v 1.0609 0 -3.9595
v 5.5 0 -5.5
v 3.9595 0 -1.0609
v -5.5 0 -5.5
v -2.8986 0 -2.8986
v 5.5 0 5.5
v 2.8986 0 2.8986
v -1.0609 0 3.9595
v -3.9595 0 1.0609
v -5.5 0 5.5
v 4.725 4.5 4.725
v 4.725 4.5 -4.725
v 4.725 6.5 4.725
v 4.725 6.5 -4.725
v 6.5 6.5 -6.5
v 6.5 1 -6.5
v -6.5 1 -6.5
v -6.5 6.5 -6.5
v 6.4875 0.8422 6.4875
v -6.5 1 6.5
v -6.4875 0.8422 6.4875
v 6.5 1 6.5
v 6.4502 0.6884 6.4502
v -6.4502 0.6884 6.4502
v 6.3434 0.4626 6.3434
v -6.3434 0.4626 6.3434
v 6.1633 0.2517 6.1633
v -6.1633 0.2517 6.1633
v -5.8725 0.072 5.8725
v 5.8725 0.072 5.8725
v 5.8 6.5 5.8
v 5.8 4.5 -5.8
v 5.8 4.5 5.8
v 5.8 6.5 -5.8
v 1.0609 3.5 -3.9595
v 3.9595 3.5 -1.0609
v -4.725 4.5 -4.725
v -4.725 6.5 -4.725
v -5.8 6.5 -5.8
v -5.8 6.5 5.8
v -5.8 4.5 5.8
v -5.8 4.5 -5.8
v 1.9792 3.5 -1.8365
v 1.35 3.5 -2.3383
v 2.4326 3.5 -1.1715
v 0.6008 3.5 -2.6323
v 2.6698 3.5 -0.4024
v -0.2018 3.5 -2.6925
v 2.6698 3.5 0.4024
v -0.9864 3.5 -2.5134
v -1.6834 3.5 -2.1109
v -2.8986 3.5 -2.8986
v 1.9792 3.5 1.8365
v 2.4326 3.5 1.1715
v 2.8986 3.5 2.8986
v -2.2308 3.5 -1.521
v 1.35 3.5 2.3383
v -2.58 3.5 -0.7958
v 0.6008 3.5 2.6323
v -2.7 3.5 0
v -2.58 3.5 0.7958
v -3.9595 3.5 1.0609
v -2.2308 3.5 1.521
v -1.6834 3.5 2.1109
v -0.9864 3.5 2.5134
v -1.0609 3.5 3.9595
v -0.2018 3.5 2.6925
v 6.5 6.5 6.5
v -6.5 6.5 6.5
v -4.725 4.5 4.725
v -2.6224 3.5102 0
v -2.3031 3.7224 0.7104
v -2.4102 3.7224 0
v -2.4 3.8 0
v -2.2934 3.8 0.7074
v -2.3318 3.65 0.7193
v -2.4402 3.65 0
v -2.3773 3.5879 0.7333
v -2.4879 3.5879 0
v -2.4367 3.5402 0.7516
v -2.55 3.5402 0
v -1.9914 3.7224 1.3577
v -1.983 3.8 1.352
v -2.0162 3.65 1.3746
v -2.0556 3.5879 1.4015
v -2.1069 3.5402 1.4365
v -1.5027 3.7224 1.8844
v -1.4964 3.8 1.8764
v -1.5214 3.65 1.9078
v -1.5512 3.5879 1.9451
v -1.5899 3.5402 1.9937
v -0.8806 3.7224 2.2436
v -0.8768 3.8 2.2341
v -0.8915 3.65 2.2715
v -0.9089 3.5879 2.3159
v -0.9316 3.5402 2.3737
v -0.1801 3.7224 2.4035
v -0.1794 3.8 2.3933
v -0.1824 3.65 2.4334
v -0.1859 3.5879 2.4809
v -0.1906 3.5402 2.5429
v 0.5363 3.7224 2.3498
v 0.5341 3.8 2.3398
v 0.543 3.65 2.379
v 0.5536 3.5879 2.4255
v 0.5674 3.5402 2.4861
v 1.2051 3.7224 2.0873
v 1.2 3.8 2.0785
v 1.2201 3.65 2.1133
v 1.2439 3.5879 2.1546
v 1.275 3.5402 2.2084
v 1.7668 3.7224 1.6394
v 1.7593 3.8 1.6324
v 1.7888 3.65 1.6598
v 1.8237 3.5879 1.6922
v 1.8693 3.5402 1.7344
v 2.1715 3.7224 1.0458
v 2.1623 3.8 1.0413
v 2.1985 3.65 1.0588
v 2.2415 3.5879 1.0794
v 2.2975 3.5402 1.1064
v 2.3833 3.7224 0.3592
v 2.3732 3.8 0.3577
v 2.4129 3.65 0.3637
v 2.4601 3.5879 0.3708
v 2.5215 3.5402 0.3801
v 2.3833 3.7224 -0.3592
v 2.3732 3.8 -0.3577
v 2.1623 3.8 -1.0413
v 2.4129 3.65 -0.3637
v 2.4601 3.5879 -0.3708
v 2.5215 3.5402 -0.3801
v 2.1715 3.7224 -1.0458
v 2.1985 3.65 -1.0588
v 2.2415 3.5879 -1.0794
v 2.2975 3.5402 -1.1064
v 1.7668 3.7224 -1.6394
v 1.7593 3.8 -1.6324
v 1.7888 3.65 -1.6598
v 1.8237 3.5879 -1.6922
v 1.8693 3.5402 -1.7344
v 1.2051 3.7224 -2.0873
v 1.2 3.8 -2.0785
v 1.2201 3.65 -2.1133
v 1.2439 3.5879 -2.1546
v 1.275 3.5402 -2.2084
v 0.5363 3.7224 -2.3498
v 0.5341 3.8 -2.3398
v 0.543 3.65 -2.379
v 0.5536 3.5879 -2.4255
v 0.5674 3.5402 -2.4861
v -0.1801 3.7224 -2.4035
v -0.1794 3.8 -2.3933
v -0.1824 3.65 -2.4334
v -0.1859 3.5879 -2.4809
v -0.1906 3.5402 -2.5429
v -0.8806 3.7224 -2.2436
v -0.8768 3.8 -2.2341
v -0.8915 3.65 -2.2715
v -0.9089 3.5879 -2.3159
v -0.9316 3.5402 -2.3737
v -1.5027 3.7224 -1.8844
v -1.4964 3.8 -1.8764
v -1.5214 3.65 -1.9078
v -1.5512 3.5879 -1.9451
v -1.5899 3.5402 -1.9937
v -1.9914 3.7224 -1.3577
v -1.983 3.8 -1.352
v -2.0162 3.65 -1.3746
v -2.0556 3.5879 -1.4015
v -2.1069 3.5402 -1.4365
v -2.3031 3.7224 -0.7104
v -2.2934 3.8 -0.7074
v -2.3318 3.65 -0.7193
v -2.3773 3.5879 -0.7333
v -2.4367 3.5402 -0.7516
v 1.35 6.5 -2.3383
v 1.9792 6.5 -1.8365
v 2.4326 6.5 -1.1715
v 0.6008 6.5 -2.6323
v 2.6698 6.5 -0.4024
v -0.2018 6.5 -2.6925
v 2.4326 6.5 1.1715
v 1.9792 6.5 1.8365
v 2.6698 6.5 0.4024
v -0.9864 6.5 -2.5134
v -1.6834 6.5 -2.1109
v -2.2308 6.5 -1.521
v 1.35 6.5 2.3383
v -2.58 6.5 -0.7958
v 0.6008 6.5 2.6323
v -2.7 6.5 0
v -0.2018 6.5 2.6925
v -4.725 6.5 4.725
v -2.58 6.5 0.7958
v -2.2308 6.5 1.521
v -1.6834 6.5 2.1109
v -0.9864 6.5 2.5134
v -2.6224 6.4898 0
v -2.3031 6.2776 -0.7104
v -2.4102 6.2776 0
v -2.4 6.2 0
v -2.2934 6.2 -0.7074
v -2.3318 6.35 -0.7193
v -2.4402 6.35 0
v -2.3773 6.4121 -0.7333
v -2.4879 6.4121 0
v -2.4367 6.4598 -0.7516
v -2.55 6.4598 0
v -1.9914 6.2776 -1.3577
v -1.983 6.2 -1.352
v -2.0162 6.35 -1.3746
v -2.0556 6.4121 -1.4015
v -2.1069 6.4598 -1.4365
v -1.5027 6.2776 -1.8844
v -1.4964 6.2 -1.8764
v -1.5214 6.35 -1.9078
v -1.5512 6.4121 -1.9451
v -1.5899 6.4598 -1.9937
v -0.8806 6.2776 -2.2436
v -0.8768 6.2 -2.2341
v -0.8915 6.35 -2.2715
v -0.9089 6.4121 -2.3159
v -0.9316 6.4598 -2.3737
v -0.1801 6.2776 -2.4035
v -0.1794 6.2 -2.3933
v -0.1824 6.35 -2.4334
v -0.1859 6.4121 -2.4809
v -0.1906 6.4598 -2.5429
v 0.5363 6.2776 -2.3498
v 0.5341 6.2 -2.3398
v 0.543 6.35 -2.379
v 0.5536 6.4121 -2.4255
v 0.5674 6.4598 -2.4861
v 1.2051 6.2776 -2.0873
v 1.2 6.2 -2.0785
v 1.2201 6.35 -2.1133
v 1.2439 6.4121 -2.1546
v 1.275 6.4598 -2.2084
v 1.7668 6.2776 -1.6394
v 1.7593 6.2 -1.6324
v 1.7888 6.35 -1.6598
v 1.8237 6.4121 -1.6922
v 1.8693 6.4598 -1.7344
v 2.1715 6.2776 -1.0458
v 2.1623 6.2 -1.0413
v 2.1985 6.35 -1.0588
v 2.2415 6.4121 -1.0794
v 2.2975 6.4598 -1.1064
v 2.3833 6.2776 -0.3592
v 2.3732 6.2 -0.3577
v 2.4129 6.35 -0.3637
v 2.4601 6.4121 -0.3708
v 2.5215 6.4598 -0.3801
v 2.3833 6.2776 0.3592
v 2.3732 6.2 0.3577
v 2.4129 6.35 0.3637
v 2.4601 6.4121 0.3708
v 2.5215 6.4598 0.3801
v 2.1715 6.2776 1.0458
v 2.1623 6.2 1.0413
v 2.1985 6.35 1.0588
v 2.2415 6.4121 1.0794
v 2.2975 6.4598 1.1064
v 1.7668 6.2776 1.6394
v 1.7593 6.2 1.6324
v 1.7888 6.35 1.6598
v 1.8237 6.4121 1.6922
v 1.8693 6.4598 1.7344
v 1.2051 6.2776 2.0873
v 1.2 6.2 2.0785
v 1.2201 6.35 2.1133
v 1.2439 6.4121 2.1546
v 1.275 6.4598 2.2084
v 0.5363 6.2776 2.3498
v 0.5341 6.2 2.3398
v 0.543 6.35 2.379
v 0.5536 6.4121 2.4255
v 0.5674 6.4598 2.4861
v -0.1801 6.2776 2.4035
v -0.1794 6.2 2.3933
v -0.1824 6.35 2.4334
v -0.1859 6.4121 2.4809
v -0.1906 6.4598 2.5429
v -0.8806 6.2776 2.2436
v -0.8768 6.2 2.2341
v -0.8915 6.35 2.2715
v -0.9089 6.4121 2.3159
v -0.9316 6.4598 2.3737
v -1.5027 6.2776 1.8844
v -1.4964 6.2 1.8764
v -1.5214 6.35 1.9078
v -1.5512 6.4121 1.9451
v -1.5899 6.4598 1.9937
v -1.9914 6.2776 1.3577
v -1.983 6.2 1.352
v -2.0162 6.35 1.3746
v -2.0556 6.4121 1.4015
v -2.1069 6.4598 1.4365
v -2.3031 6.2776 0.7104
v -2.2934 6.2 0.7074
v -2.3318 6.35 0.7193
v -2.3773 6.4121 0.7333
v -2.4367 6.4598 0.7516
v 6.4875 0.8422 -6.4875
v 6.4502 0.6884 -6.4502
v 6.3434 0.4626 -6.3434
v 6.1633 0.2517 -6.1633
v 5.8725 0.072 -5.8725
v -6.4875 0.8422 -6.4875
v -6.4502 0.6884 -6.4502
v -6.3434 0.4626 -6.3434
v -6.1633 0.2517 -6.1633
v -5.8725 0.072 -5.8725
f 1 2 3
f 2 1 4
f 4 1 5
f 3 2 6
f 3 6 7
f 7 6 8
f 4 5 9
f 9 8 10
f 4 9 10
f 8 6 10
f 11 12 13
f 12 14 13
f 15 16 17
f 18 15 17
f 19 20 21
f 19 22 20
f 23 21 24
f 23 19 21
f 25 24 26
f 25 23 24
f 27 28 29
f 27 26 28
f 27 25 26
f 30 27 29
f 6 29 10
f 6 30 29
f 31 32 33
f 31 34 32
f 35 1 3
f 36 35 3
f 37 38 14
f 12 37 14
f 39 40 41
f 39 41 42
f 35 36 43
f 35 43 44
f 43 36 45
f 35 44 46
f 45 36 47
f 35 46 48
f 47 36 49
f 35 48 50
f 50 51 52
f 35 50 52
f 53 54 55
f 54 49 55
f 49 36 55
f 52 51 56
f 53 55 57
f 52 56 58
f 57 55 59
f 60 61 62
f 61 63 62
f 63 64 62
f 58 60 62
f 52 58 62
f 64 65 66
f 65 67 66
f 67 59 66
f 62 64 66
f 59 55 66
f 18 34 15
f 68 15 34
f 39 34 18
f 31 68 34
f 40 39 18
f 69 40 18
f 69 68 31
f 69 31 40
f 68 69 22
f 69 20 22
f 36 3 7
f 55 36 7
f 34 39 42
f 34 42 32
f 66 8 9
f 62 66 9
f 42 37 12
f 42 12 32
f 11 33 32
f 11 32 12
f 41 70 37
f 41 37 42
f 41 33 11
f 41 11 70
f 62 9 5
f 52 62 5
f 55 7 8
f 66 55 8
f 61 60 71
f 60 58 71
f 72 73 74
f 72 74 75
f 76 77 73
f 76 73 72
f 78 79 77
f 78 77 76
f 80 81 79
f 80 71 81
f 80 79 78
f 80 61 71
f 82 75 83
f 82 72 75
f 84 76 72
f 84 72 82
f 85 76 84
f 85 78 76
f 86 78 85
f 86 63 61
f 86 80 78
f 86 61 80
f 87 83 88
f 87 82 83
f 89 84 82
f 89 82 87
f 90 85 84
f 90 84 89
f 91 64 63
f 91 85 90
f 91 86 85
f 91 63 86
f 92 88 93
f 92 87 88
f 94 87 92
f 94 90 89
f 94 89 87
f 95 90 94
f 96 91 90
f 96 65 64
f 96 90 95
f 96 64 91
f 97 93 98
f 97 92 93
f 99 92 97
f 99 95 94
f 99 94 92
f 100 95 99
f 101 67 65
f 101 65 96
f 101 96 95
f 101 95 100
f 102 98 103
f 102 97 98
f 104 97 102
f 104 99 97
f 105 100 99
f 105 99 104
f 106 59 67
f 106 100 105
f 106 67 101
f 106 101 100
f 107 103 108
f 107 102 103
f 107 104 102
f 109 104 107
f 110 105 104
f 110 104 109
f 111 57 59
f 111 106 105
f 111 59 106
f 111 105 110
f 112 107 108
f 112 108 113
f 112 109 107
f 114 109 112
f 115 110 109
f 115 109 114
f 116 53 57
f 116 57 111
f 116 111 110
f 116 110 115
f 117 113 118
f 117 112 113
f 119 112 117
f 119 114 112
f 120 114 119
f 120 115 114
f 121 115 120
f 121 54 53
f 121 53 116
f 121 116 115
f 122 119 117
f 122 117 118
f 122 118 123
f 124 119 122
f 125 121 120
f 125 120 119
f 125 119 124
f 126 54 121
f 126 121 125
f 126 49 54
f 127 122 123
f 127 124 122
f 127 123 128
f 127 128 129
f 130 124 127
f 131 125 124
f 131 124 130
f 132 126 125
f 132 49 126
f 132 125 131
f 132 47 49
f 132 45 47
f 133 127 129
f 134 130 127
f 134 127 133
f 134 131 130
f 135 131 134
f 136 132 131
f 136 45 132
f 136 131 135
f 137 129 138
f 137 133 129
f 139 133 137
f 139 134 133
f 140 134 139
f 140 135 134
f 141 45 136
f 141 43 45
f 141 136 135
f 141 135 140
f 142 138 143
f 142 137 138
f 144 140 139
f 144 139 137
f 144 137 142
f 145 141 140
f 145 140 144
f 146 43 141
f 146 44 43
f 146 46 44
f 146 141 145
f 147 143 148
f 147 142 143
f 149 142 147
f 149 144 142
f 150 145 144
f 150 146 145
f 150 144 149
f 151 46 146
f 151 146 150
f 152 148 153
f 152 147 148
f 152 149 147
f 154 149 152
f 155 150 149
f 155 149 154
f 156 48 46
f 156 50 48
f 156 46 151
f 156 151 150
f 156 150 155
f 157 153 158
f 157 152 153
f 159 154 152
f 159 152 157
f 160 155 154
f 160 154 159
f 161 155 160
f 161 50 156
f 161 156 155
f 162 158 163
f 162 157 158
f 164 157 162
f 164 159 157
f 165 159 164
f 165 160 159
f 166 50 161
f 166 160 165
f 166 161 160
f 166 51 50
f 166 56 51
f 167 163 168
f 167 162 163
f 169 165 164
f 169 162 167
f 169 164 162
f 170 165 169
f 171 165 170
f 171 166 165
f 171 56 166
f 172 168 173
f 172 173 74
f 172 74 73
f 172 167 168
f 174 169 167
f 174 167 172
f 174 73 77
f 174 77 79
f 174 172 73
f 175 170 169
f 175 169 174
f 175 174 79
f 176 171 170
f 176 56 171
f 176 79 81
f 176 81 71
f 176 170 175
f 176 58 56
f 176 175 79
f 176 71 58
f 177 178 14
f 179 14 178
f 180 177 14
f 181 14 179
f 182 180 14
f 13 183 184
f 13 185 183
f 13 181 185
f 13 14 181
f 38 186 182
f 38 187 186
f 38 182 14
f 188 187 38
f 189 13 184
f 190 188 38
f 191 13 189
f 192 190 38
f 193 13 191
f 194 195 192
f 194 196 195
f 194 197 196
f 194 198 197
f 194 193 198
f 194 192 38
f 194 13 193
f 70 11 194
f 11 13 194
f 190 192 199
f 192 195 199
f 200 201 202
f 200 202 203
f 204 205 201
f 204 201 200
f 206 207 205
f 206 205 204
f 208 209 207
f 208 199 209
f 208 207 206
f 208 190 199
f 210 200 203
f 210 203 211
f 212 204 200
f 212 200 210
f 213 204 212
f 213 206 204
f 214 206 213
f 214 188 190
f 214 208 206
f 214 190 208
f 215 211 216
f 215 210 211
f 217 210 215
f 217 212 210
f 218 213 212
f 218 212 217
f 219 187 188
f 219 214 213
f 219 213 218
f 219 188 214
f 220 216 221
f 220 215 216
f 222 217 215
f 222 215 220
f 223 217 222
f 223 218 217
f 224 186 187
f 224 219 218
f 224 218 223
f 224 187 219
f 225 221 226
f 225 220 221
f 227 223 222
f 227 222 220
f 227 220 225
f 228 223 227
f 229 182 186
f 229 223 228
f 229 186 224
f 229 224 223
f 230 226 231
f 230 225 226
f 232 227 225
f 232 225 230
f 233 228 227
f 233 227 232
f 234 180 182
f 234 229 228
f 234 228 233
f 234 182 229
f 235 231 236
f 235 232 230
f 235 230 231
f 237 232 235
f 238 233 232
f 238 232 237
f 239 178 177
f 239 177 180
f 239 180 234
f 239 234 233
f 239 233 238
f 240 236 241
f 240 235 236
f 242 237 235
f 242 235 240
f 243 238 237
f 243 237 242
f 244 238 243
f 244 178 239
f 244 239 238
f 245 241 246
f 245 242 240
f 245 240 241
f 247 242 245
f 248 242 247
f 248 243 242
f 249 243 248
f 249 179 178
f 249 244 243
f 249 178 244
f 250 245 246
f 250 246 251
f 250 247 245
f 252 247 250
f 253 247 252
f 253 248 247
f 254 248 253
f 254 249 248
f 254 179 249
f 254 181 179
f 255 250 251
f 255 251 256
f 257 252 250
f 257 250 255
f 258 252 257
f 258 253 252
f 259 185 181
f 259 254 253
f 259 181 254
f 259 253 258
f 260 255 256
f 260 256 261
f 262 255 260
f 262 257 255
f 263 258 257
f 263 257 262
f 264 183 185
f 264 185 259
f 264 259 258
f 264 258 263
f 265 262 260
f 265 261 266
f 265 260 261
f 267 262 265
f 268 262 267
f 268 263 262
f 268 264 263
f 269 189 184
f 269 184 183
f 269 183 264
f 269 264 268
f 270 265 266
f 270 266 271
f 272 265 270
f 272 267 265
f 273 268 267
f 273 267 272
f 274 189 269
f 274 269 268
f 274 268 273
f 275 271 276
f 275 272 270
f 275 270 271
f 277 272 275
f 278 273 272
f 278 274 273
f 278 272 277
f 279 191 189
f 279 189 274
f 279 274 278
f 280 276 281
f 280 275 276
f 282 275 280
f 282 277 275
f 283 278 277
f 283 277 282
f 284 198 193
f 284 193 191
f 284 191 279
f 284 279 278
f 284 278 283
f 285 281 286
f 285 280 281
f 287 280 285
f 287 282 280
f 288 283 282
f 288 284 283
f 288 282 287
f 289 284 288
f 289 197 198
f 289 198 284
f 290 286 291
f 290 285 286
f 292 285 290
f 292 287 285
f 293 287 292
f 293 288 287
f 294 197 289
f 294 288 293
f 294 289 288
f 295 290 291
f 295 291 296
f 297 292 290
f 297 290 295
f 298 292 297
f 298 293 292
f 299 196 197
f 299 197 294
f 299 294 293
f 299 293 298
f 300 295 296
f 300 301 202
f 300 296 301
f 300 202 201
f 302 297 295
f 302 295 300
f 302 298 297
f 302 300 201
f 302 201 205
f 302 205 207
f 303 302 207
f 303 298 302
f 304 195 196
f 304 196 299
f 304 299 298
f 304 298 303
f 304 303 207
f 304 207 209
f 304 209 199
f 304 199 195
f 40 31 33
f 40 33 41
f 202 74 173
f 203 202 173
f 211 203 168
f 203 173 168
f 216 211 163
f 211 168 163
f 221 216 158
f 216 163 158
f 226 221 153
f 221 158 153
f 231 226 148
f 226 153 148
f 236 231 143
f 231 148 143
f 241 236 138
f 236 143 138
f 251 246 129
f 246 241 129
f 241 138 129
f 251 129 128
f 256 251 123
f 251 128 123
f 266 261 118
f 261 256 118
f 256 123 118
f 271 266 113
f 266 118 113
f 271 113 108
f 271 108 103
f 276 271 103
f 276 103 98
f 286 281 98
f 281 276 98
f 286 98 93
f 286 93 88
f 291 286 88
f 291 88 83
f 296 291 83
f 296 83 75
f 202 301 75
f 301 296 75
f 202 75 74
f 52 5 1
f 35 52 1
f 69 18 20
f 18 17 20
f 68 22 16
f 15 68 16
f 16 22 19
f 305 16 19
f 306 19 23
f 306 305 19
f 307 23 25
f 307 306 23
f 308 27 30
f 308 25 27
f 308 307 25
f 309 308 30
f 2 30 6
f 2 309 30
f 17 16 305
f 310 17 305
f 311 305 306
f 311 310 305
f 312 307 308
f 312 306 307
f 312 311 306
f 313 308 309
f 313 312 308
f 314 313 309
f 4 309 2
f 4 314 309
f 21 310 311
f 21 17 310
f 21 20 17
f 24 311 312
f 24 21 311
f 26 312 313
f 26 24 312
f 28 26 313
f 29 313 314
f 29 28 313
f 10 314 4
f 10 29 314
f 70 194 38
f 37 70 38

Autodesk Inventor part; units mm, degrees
ref_plane "YZ Plane" through (0, 0, 0) normal (1, 0, 0) x (0, 1, 0)
ref_plane "XY Plane" through (0, 0, 0) normal (0, 0, 1) x (1, 0, 0)
ref_plane "作業平面2" through (0, 6.5, 0) normal (0, 1, 0) x (-1, 0, 0)
sketch "スケッチ3" plane through (0, 6.5, 0) normal (0, 1, 0) x (-1, 0, 0)
  line L0 (4.725, -4.725) -> (-4.725, -4.725)
  line L1 (-4.725, -4.725) -> (-4.725, 4.725)
  line L2 (-4.725, 4.725) -> (4.725, 4.725)
  line L3 (4.725, 4.725) -> (4.725, -4.725)
  line L4 (4.725, -4.725) -> (-4.725, 4.725) construction
  line L5 (-4.725, -4.725) -> (4.725, 4.725) construction
  line L6 (5.8, -5.8) -> (-5.8, -5.8)
  line L7 (-5.8, -5.8) -> (-5.8, 5.8)
  line L8 (-5.8, 5.8) -> (5.8, 5.8)
  line L9 (5.8, 5.8) -> (5.8, -5.8)
  line L10 (5.8, -5.8) -> (-5.8, 5.8) construction
  line L11 (-5.8, -5.8) -> (5.8, 5.8) construction
  point P0 (0, 0)
  point P1 (0, 0)
  dimension "d19" = 9.45
  dimension "d20" = 9.45
  dimension "d21" = 11.6
  dimension "d22" = 11.6
sketch "スケッチ1" plane through (0, 0, 0) normal (0, 1, 0) x (-1, 0, 0)
  line L0 (6.5, -6.5) -> (-6.5, 6.5) construction
  line L1 (-6.5, -6.5) -> (6.5, 6.5) construction
  line L2 (1.0609, 3.9595) -> (3.9595, 1.0609)
  line L3 (3.9595, 1.0609) -> (2.8986, -2.8986)
  line L4 (2.8986, -2.8986) -> (-1.0609, -3.9595)
  line L5 (-1.0609, -3.9595) -> (-3.9595, -1.0609)
  line L6 (-3.9595, -1.0609) -> (-2.8986, 2.8986)
  line L7 (-2.8986, 2.8986) -> (1.0609, 3.9595)
  line L8 (-6.5, -6.5) -> (6.5, -6.5)
  line L9 (6.5, -6.5) -> (6.5, 6.5)
  line L10 (6.5, 6.5) -> (-6.5, 6.5)
  line L11 (-6.5, 6.5) -> (-6.5, -6.5)
  line L12 (-6.5, -6.5) -> (6.5, 6.5) construction
  line L13 (6.5, -6.5) -> (-6.5, 6.5) construction
  circle A0 centre (0, 0) radius 2.4
  dimension "d33" = 7.1
  dimension "d34" = 13
  dimension "d35" = 13
  dimension "d36" = 4.8
extrude "押し出し8" add sketch "スケッチ1" along normal blind 6.5 contours L2 L3 L4 L5 L6 L7 | L11 L10 L9 L8 | A0
extrude "押し出し9" cut sketch "スケッチ3" against normal blind 2
extrude "押し出し10" cut sketch "スケッチ1" along normal blind 3.5 contours L2 L3 L4 L5 L6 L7
extrude "押し出し11" cut sketch "スケッチ1" along normal blind 6.5 contours A0
fillet "フィレット2" radius 1 4 edges at (-6.5, 0, 0) (0, 0, 6.5) (0, 0, -6.5) (6.5, 0, 0)
fillet "フィレット3" radius 0.3 1 edges at (2.4, 6.5, 0)
fillet "フィレット4" radius 0.3 1 edges at (2.4, 3.5, 0)
equation "\"d20\" = d19"
equation "\"d22\" = d21"
properties part number "pin_joint_ver1"
